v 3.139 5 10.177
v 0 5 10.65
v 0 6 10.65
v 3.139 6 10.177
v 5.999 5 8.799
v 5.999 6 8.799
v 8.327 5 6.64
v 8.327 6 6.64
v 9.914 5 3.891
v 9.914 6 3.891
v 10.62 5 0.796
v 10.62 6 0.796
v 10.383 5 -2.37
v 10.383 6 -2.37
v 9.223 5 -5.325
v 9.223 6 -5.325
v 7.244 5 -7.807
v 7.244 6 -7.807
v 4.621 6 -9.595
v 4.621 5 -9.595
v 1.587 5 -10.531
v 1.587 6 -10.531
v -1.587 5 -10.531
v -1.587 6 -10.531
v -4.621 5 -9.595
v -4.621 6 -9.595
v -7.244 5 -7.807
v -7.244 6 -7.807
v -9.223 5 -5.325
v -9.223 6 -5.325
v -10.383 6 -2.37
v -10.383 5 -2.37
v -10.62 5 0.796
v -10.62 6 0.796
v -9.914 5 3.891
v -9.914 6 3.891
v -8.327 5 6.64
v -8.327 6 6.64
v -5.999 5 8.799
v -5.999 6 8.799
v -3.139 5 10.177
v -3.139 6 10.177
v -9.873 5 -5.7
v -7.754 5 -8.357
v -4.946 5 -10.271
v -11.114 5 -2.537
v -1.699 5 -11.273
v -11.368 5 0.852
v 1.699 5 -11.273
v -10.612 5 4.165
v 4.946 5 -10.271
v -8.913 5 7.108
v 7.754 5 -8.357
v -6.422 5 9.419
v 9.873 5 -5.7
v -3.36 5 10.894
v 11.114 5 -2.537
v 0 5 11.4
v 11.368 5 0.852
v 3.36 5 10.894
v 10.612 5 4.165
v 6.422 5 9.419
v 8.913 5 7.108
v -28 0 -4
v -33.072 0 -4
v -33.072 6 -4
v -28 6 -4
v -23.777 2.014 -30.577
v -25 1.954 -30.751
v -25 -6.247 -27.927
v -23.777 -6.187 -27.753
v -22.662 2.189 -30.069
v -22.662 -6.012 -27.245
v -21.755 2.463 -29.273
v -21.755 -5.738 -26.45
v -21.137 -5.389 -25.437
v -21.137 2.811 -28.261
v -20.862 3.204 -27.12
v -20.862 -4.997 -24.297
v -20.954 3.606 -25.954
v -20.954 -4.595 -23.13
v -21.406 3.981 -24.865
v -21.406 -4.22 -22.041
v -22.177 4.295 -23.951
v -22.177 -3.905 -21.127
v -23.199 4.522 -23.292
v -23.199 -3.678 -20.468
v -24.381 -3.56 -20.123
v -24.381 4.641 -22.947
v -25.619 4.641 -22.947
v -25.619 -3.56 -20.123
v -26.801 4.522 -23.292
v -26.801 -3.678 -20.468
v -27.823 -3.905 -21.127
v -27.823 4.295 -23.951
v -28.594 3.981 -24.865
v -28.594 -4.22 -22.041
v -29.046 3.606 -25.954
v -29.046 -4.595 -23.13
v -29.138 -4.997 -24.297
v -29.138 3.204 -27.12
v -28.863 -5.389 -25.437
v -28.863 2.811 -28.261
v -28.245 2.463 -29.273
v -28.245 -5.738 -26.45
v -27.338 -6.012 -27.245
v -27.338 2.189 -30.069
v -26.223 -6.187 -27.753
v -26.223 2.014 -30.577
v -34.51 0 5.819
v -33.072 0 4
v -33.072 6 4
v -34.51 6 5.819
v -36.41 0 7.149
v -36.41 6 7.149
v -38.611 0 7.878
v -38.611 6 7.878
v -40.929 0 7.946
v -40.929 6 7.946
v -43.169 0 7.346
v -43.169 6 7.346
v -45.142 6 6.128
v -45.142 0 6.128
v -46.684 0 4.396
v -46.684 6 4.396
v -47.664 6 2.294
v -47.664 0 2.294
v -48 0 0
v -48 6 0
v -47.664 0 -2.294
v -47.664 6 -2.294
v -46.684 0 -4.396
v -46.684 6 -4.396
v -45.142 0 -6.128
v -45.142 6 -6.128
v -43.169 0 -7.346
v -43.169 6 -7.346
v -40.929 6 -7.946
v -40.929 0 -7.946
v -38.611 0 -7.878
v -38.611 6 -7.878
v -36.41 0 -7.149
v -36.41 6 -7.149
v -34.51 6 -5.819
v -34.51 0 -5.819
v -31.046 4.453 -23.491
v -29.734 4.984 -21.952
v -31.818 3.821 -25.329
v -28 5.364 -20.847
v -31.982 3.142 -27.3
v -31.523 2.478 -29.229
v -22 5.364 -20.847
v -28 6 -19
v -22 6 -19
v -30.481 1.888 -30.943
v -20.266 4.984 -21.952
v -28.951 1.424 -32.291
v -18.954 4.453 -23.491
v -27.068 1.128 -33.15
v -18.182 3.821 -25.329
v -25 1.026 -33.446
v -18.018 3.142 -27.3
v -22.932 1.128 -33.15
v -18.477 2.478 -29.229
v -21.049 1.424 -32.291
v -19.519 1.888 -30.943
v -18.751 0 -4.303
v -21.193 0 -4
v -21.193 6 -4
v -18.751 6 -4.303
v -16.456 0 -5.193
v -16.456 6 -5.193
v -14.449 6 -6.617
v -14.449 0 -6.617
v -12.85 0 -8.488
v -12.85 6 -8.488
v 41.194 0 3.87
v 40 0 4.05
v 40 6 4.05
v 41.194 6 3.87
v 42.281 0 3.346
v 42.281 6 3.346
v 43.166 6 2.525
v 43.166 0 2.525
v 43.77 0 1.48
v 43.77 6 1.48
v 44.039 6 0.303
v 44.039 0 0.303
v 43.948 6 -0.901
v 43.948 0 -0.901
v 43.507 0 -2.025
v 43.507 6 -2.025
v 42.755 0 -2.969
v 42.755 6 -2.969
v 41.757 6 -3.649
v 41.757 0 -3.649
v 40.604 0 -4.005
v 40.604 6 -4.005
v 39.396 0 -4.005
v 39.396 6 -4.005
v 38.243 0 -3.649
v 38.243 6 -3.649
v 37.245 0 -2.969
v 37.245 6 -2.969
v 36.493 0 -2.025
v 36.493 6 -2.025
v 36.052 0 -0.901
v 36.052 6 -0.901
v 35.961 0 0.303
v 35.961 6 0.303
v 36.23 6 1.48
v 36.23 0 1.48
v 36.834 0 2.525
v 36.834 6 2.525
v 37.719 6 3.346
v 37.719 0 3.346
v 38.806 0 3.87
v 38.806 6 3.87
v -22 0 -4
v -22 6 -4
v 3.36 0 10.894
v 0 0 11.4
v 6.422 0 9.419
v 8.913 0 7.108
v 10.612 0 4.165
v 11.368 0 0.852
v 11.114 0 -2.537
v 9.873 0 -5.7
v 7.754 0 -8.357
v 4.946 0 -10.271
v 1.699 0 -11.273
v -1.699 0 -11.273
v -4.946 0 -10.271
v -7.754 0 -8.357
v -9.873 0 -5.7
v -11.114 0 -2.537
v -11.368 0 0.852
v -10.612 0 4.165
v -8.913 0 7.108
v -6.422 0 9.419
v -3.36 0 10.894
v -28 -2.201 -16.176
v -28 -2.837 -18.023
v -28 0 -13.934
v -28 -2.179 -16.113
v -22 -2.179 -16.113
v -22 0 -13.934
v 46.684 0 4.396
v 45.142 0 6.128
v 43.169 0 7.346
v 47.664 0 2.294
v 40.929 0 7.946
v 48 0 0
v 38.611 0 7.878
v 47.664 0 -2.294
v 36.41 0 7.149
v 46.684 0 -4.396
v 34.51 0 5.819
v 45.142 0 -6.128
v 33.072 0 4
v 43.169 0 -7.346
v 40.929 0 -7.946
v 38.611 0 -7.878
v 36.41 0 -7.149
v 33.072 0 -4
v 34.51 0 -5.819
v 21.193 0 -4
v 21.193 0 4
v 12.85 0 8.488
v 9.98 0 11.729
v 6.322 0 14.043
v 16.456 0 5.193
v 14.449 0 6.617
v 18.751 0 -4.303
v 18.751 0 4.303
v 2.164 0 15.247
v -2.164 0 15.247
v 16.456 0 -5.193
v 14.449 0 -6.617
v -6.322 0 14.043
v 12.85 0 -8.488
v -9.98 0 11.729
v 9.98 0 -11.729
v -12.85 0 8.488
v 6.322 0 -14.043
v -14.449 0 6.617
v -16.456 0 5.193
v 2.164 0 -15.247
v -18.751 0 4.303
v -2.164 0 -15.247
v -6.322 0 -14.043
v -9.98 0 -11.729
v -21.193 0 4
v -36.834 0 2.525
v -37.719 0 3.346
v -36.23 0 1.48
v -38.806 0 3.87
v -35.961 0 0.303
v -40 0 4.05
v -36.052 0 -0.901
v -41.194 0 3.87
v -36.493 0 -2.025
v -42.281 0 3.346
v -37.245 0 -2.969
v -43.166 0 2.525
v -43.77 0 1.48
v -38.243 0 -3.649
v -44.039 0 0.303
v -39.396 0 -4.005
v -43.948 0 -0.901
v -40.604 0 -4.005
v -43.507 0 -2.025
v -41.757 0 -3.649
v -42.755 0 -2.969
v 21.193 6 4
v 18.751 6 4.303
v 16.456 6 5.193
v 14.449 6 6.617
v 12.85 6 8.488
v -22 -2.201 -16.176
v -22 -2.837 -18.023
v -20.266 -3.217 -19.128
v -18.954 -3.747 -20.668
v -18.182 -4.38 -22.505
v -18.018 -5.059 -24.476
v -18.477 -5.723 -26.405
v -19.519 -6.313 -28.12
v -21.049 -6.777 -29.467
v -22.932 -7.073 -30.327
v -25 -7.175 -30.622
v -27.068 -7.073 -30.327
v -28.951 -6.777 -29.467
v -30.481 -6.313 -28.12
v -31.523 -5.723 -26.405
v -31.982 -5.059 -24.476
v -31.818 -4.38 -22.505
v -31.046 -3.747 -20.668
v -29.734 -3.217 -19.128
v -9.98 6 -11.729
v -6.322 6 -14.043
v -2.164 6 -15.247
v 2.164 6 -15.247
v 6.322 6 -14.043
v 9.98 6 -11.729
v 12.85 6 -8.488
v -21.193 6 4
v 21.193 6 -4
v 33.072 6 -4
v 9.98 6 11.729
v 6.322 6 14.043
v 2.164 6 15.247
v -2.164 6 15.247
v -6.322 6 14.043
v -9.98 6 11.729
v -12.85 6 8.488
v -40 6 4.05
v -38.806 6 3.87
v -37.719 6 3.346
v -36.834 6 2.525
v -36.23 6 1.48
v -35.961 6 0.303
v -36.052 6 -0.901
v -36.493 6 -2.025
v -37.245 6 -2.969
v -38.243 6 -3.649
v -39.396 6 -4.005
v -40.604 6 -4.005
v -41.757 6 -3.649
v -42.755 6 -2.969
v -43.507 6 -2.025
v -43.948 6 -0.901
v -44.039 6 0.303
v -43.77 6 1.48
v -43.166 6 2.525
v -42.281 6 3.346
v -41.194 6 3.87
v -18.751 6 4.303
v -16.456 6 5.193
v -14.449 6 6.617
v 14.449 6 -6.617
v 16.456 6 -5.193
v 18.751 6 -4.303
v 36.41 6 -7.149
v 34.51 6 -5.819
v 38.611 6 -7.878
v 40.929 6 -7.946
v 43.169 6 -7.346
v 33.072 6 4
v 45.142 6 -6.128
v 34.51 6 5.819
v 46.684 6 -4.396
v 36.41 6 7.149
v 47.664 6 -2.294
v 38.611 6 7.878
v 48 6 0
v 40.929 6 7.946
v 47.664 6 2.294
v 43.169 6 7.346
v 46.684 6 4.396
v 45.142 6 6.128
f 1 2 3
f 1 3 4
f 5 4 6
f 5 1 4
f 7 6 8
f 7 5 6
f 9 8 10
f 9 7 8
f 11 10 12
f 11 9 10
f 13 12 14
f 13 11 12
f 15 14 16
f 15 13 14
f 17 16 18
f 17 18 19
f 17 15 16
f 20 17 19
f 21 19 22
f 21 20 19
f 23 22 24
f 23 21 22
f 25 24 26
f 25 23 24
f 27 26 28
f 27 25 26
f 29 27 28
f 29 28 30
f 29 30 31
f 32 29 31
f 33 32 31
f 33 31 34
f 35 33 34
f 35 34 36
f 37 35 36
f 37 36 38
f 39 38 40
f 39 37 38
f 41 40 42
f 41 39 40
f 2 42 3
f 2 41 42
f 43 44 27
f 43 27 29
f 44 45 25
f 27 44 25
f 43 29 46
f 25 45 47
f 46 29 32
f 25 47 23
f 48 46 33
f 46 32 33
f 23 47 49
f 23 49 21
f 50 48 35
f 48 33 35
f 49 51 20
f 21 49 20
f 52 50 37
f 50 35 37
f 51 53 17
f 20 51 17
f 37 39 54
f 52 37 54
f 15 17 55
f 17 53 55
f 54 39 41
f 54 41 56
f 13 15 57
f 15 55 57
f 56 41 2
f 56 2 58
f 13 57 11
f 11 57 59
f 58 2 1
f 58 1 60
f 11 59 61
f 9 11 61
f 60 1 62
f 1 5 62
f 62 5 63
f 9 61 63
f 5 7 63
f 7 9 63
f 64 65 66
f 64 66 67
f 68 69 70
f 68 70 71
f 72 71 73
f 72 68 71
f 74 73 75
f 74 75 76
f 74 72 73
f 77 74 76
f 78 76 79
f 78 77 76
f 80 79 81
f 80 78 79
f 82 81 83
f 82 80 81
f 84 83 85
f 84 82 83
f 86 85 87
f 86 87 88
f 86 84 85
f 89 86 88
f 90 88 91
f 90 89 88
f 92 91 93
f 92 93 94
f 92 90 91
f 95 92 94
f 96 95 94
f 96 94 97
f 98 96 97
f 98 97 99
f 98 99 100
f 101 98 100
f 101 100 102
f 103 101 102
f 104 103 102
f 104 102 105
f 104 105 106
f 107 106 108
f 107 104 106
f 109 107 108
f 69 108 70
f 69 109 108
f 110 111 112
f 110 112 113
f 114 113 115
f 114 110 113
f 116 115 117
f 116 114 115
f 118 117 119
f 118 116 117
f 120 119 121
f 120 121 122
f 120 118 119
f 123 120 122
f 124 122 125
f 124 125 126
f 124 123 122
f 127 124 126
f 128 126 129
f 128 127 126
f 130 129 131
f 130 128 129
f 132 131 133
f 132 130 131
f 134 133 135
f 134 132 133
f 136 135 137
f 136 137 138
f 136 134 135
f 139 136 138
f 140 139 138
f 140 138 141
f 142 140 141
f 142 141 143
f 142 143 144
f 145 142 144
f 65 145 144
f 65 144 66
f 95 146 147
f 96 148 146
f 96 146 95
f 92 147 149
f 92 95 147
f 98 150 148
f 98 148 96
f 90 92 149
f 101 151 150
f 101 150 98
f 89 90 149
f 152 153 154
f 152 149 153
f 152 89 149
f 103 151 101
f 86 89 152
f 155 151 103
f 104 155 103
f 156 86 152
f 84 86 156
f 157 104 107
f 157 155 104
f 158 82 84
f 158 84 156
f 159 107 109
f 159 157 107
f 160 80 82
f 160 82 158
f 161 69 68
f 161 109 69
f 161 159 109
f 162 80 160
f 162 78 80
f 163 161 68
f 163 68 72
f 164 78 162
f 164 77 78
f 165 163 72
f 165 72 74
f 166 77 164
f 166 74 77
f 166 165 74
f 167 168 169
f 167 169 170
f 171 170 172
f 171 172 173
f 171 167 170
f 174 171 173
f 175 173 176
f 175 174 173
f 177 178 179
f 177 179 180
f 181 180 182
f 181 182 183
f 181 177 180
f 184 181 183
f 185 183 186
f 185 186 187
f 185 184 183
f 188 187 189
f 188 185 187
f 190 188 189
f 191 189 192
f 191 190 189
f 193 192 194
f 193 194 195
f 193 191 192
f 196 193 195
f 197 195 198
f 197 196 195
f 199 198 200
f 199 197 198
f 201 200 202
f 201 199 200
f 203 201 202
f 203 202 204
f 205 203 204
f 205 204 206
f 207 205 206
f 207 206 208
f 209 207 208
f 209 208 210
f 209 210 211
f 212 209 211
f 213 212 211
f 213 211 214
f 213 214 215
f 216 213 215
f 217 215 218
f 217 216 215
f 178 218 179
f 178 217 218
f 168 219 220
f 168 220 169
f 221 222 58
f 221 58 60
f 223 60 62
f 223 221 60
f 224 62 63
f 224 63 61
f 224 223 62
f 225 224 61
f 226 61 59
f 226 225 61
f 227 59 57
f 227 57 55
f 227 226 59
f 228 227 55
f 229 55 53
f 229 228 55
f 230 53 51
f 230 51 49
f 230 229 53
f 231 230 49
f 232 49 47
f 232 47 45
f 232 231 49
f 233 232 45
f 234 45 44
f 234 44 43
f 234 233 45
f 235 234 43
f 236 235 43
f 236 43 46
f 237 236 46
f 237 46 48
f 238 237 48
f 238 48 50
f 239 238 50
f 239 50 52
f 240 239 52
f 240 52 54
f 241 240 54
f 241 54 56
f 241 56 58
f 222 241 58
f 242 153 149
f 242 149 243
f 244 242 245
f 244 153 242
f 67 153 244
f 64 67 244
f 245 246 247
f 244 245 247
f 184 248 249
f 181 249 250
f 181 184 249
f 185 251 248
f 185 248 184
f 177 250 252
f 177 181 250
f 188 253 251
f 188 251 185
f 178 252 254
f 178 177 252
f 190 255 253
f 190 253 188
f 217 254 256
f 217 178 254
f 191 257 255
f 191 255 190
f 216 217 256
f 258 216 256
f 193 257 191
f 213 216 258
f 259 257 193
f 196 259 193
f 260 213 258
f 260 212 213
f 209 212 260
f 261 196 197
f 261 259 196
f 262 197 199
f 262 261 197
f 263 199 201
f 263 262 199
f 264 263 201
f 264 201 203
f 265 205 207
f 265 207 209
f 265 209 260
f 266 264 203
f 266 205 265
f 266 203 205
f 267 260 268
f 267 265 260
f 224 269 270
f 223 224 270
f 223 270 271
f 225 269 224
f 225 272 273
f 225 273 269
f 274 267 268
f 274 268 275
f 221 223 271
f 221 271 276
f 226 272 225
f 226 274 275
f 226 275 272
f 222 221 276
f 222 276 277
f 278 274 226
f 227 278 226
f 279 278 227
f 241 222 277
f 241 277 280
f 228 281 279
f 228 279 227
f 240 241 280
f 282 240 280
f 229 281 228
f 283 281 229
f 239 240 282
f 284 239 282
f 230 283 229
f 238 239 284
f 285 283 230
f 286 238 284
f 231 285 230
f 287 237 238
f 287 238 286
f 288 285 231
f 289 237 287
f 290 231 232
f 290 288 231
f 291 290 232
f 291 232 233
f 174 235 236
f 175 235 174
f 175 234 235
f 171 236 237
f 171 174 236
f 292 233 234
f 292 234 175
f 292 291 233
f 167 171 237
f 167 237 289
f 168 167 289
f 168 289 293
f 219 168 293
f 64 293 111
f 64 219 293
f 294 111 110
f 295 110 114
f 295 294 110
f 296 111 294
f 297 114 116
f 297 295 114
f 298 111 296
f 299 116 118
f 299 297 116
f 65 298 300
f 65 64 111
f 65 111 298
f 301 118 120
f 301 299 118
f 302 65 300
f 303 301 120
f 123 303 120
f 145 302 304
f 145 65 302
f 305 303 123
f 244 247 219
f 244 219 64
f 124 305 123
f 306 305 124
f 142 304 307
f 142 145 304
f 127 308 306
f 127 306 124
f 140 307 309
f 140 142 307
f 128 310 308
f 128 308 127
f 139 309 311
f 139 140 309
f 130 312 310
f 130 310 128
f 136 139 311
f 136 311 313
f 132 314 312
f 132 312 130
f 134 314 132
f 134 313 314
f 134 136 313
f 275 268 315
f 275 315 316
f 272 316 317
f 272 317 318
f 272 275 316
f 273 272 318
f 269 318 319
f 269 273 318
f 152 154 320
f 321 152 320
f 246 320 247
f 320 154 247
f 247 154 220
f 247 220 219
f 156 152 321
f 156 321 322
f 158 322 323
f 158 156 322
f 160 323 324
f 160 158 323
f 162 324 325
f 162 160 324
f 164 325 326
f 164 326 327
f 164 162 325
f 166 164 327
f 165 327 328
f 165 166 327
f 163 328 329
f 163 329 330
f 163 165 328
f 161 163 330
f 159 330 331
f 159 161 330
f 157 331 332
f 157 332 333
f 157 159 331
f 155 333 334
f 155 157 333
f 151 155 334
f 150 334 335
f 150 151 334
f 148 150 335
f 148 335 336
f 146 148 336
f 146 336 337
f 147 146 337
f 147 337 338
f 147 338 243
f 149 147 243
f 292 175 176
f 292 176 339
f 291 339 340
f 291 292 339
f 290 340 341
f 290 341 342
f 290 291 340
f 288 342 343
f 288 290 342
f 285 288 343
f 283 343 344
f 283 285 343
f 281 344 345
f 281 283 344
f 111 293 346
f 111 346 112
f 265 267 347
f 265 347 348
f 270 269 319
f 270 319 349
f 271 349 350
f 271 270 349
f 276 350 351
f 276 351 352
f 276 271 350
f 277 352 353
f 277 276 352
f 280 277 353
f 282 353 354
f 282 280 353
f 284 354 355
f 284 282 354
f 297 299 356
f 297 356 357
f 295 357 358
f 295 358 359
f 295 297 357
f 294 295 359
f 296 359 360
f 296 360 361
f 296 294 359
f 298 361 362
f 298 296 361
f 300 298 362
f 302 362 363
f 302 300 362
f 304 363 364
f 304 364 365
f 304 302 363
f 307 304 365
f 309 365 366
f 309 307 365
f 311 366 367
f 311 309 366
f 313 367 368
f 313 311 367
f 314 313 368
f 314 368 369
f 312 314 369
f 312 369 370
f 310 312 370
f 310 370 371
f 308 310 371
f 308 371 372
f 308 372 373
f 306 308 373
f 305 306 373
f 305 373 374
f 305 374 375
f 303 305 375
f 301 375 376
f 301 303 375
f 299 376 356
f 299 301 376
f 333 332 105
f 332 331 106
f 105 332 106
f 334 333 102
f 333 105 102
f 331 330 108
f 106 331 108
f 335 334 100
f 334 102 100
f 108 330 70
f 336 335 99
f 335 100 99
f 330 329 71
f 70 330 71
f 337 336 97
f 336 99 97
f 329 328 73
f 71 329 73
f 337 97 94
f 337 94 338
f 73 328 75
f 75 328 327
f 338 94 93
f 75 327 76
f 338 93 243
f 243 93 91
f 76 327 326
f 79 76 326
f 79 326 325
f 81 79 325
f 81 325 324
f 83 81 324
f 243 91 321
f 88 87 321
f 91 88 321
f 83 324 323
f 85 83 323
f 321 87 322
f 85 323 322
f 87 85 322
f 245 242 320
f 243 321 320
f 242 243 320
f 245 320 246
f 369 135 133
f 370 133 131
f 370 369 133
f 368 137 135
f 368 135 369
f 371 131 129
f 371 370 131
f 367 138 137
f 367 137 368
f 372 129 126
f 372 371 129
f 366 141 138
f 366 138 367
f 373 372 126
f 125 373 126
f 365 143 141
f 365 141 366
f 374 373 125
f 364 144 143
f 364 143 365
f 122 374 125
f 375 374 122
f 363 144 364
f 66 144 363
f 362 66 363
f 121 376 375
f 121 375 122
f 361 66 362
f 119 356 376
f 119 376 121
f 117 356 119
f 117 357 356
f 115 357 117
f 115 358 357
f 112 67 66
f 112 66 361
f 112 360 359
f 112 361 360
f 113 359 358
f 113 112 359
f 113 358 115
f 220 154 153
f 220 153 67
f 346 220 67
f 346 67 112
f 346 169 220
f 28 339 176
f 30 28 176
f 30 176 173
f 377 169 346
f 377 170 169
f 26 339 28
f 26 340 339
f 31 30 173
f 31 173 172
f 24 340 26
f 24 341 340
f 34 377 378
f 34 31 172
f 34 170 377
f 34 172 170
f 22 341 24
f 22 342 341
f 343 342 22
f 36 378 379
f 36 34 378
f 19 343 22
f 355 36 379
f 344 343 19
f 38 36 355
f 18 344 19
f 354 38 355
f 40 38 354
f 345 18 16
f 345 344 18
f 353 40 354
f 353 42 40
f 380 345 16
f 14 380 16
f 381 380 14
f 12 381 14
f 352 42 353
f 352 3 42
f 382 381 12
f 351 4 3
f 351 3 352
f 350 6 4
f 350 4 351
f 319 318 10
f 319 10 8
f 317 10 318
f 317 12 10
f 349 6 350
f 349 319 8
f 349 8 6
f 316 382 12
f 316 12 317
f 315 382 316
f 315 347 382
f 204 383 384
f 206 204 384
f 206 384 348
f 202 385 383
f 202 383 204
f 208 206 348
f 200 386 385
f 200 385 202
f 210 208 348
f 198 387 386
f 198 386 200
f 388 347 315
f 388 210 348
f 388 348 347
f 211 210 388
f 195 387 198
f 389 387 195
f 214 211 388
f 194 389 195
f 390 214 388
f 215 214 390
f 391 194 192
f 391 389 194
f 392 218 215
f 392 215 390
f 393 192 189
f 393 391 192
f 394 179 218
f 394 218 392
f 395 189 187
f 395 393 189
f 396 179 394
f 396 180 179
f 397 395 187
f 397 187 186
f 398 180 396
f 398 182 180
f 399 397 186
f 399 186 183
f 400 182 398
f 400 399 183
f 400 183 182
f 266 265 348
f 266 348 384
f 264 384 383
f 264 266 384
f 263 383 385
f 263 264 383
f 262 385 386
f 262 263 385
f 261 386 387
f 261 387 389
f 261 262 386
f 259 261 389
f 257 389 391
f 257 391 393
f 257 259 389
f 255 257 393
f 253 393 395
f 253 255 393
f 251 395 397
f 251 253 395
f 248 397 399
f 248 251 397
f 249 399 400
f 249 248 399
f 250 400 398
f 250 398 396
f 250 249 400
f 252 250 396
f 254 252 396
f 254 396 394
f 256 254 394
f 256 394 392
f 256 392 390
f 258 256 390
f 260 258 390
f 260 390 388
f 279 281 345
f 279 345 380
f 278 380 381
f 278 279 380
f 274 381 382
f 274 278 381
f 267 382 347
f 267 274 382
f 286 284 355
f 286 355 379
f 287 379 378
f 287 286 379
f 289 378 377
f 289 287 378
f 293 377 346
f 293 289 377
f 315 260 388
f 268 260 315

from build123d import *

# Parameters (mm, degrees)
ESBO_O1_R                     = 4.05
ESBO_O1_R_2                   = 11.4
RESSALTO_EXTRUS_O1_DEPTH      = 6
RESSALTO_EXTRUS_O2_START      = -1
ESBO_O2_R                     = 11.4
ESBO_O2_R_2                   = 10.65
RESSALTO_EXTRUS_O2_DEPTH      = 1
RESSALTO_EXTRUS_O4_DEPTH      = 3
RESSALTO_EXTRUS_O4_DEPTH_BACK = 5.673111
ESBO_O4_R                     = 4.15
CHANFRO1_SIZE                 = 2.360185131
CHANFRO1_SIZE_2               = 3


with BuildPart() as part:
    # Esboço1 → Ressalto-extrusão1 (new body)
    with BuildSketch(Plane(origin=(0, 0, 0), x_dir=(1, 0, 0), z_dir=(0, 1, 0))):
        with BuildLine():
            Line((-33.07179677, 4), (-28, 4))
            Line((-28, 4), (-28, 19))
            Line((-28, 19), (-22, 19))
            Line((-22, 19), (-22, 4))
            Line((-22, 4), (-21.193395198, 4))
            ThreePointArc((-21.193395198, 4), (-16.456207753, 5.193238103), (-12.849538821, 8.488188976))
            ThreePointArc((-12.849538821, 8.488188976), (0, 15.4), (12.849538821, 8.488188976))
            ThreePointArc((12.849538821, 8.488188976), (16.456207753, 5.193238103), (21.193395198, 4))
            Line((21.193395198, 4), (33.07179677, 4))
            ThreePointArc((33.07179677, 4), (48, 0), (33.07179677, -4))
            Line((33.07179677, -4), (21.193395198, -4))
            ThreePointArc((21.193395198, -4), (16.456207753, -5.193238103), (12.849538821, -8.488188976))
            ThreePointArc((12.849538821, -8.488188976), (0, -15.4), (-12.849538821, -8.488188976))
            ThreePointArc((-12.849538821, -8.488188976), (-16.456207753, -5.193238103), (-21.193395198, -4))
            Line((-21.193395198, -4), (-33.07179677, -4))
            ThreePointArc((-33.07179677, -4), (-48, 0), (-33.07179677, 4))
        make_face()
        with Locations(Location((40, 0, 0), (0, 0, 270))):
            Circle(ESBO_O1_R, mode=Mode.SUBTRACT)
        with Locations(Location((-40, 0, 0), (0, 0, 270))):
            Circle(ESBO_O1_R, mode=Mode.SUBTRACT)
        with Locations(Location((0, 0, 0), (0, 0, 270))):
            Circle(ESBO_O1_R_2, mode=Mode.SUBTRACT)
    extrude(amount=RESSALTO_EXTRUS_O1_DEPTH)

    # Esboço2 → Ressalto-extrusão2 (add)
    with BuildSketch(Plane(origin=(0, 6, 0), x_dir=(1, 0, 0), z_dir=(0, 1, 0)).offset(RESSALTO_EXTRUS_O2_START)):
        with Locations(Location((0, 0, 0), (0, 0, 270))):
            Circle(ESBO_O2_R)
        with Locations(Location((0, 0, 0), (0, 0, 270))):
            Circle(ESBO_O2_R_2, mode=Mode.SUBTRACT)
    extrude(amount=RESSALTO_EXTRUS_O2_DEPTH)

    # Esboço4 → Ressalto-extrusão4 (add, two sides: drawn at the far end of the back side and taken through both)
    with BuildSketch(Plane(origin=(0, 5.848784016, -2.013897841), x_dir=(-1, 0, 0), z_dir=(0, -0.9455185755993178, 0.32556815445715404)).offset(-RESSALTO_EXTRUS_O4_DEPTH_BACK)):
        with BuildLine():
            Line((28, 16.01144401), (22, 16.01144401))
            Line((22, 16.01144401), (22, 17.964852936))
            ThreePointArc((22, 17.964852936), (25, 31.289408257), (28, 17.964852936))
            Line((28, 17.964852936), (28, 16.01144401))
        make_face()
        with Locations(Location((25, 24.289408257, 0), (0, 0, 90))):
            Circle(ESBO_O4_R, mode=Mode.SUBTRACT)
    extrude(amount=RESSALTO_EXTRUS_O4_DEPTH + RESSALTO_EXTRUS_O4_DEPTH_BACK)

    # Chanfro1
    # the kernel refuses this chamfer: 3, 2.360185131 mm, written as the material it adds along each edge
    with BuildSketch(Plane(origin=(-22, 0, -16.93403432), x_dir=(0, -0.9591141724296175, 0.28301944146056485), z_dir=(-1, 0, 0))) as chanfro1_piece_1_section:
        Polygon((CHANFRO1_SIZE * 0.999002383221, CHANFRO1_SIZE * 0.0446568918676), (CHANFRO1_SIZE_2 * 0.283019441461, CHANFRO1_SIZE_2 * 0.95911417243), (0, 0), align=None)
    chanfro1_piece_1 = extrude(amount=6, mode=Mode.PRIVATE)
    chanfro1_piece_1 = split(chanfro1_piece_1, bisect_by=Plane(origin=(-25, -1.892415704, -15.281313813), z_dir=(0, 0.9455185755993178, -0.32556815445715404)), keep=Keep.TOP, mode=Mode.PRIVATE)
    add(chanfro1_piece_1)


solid = part.part
